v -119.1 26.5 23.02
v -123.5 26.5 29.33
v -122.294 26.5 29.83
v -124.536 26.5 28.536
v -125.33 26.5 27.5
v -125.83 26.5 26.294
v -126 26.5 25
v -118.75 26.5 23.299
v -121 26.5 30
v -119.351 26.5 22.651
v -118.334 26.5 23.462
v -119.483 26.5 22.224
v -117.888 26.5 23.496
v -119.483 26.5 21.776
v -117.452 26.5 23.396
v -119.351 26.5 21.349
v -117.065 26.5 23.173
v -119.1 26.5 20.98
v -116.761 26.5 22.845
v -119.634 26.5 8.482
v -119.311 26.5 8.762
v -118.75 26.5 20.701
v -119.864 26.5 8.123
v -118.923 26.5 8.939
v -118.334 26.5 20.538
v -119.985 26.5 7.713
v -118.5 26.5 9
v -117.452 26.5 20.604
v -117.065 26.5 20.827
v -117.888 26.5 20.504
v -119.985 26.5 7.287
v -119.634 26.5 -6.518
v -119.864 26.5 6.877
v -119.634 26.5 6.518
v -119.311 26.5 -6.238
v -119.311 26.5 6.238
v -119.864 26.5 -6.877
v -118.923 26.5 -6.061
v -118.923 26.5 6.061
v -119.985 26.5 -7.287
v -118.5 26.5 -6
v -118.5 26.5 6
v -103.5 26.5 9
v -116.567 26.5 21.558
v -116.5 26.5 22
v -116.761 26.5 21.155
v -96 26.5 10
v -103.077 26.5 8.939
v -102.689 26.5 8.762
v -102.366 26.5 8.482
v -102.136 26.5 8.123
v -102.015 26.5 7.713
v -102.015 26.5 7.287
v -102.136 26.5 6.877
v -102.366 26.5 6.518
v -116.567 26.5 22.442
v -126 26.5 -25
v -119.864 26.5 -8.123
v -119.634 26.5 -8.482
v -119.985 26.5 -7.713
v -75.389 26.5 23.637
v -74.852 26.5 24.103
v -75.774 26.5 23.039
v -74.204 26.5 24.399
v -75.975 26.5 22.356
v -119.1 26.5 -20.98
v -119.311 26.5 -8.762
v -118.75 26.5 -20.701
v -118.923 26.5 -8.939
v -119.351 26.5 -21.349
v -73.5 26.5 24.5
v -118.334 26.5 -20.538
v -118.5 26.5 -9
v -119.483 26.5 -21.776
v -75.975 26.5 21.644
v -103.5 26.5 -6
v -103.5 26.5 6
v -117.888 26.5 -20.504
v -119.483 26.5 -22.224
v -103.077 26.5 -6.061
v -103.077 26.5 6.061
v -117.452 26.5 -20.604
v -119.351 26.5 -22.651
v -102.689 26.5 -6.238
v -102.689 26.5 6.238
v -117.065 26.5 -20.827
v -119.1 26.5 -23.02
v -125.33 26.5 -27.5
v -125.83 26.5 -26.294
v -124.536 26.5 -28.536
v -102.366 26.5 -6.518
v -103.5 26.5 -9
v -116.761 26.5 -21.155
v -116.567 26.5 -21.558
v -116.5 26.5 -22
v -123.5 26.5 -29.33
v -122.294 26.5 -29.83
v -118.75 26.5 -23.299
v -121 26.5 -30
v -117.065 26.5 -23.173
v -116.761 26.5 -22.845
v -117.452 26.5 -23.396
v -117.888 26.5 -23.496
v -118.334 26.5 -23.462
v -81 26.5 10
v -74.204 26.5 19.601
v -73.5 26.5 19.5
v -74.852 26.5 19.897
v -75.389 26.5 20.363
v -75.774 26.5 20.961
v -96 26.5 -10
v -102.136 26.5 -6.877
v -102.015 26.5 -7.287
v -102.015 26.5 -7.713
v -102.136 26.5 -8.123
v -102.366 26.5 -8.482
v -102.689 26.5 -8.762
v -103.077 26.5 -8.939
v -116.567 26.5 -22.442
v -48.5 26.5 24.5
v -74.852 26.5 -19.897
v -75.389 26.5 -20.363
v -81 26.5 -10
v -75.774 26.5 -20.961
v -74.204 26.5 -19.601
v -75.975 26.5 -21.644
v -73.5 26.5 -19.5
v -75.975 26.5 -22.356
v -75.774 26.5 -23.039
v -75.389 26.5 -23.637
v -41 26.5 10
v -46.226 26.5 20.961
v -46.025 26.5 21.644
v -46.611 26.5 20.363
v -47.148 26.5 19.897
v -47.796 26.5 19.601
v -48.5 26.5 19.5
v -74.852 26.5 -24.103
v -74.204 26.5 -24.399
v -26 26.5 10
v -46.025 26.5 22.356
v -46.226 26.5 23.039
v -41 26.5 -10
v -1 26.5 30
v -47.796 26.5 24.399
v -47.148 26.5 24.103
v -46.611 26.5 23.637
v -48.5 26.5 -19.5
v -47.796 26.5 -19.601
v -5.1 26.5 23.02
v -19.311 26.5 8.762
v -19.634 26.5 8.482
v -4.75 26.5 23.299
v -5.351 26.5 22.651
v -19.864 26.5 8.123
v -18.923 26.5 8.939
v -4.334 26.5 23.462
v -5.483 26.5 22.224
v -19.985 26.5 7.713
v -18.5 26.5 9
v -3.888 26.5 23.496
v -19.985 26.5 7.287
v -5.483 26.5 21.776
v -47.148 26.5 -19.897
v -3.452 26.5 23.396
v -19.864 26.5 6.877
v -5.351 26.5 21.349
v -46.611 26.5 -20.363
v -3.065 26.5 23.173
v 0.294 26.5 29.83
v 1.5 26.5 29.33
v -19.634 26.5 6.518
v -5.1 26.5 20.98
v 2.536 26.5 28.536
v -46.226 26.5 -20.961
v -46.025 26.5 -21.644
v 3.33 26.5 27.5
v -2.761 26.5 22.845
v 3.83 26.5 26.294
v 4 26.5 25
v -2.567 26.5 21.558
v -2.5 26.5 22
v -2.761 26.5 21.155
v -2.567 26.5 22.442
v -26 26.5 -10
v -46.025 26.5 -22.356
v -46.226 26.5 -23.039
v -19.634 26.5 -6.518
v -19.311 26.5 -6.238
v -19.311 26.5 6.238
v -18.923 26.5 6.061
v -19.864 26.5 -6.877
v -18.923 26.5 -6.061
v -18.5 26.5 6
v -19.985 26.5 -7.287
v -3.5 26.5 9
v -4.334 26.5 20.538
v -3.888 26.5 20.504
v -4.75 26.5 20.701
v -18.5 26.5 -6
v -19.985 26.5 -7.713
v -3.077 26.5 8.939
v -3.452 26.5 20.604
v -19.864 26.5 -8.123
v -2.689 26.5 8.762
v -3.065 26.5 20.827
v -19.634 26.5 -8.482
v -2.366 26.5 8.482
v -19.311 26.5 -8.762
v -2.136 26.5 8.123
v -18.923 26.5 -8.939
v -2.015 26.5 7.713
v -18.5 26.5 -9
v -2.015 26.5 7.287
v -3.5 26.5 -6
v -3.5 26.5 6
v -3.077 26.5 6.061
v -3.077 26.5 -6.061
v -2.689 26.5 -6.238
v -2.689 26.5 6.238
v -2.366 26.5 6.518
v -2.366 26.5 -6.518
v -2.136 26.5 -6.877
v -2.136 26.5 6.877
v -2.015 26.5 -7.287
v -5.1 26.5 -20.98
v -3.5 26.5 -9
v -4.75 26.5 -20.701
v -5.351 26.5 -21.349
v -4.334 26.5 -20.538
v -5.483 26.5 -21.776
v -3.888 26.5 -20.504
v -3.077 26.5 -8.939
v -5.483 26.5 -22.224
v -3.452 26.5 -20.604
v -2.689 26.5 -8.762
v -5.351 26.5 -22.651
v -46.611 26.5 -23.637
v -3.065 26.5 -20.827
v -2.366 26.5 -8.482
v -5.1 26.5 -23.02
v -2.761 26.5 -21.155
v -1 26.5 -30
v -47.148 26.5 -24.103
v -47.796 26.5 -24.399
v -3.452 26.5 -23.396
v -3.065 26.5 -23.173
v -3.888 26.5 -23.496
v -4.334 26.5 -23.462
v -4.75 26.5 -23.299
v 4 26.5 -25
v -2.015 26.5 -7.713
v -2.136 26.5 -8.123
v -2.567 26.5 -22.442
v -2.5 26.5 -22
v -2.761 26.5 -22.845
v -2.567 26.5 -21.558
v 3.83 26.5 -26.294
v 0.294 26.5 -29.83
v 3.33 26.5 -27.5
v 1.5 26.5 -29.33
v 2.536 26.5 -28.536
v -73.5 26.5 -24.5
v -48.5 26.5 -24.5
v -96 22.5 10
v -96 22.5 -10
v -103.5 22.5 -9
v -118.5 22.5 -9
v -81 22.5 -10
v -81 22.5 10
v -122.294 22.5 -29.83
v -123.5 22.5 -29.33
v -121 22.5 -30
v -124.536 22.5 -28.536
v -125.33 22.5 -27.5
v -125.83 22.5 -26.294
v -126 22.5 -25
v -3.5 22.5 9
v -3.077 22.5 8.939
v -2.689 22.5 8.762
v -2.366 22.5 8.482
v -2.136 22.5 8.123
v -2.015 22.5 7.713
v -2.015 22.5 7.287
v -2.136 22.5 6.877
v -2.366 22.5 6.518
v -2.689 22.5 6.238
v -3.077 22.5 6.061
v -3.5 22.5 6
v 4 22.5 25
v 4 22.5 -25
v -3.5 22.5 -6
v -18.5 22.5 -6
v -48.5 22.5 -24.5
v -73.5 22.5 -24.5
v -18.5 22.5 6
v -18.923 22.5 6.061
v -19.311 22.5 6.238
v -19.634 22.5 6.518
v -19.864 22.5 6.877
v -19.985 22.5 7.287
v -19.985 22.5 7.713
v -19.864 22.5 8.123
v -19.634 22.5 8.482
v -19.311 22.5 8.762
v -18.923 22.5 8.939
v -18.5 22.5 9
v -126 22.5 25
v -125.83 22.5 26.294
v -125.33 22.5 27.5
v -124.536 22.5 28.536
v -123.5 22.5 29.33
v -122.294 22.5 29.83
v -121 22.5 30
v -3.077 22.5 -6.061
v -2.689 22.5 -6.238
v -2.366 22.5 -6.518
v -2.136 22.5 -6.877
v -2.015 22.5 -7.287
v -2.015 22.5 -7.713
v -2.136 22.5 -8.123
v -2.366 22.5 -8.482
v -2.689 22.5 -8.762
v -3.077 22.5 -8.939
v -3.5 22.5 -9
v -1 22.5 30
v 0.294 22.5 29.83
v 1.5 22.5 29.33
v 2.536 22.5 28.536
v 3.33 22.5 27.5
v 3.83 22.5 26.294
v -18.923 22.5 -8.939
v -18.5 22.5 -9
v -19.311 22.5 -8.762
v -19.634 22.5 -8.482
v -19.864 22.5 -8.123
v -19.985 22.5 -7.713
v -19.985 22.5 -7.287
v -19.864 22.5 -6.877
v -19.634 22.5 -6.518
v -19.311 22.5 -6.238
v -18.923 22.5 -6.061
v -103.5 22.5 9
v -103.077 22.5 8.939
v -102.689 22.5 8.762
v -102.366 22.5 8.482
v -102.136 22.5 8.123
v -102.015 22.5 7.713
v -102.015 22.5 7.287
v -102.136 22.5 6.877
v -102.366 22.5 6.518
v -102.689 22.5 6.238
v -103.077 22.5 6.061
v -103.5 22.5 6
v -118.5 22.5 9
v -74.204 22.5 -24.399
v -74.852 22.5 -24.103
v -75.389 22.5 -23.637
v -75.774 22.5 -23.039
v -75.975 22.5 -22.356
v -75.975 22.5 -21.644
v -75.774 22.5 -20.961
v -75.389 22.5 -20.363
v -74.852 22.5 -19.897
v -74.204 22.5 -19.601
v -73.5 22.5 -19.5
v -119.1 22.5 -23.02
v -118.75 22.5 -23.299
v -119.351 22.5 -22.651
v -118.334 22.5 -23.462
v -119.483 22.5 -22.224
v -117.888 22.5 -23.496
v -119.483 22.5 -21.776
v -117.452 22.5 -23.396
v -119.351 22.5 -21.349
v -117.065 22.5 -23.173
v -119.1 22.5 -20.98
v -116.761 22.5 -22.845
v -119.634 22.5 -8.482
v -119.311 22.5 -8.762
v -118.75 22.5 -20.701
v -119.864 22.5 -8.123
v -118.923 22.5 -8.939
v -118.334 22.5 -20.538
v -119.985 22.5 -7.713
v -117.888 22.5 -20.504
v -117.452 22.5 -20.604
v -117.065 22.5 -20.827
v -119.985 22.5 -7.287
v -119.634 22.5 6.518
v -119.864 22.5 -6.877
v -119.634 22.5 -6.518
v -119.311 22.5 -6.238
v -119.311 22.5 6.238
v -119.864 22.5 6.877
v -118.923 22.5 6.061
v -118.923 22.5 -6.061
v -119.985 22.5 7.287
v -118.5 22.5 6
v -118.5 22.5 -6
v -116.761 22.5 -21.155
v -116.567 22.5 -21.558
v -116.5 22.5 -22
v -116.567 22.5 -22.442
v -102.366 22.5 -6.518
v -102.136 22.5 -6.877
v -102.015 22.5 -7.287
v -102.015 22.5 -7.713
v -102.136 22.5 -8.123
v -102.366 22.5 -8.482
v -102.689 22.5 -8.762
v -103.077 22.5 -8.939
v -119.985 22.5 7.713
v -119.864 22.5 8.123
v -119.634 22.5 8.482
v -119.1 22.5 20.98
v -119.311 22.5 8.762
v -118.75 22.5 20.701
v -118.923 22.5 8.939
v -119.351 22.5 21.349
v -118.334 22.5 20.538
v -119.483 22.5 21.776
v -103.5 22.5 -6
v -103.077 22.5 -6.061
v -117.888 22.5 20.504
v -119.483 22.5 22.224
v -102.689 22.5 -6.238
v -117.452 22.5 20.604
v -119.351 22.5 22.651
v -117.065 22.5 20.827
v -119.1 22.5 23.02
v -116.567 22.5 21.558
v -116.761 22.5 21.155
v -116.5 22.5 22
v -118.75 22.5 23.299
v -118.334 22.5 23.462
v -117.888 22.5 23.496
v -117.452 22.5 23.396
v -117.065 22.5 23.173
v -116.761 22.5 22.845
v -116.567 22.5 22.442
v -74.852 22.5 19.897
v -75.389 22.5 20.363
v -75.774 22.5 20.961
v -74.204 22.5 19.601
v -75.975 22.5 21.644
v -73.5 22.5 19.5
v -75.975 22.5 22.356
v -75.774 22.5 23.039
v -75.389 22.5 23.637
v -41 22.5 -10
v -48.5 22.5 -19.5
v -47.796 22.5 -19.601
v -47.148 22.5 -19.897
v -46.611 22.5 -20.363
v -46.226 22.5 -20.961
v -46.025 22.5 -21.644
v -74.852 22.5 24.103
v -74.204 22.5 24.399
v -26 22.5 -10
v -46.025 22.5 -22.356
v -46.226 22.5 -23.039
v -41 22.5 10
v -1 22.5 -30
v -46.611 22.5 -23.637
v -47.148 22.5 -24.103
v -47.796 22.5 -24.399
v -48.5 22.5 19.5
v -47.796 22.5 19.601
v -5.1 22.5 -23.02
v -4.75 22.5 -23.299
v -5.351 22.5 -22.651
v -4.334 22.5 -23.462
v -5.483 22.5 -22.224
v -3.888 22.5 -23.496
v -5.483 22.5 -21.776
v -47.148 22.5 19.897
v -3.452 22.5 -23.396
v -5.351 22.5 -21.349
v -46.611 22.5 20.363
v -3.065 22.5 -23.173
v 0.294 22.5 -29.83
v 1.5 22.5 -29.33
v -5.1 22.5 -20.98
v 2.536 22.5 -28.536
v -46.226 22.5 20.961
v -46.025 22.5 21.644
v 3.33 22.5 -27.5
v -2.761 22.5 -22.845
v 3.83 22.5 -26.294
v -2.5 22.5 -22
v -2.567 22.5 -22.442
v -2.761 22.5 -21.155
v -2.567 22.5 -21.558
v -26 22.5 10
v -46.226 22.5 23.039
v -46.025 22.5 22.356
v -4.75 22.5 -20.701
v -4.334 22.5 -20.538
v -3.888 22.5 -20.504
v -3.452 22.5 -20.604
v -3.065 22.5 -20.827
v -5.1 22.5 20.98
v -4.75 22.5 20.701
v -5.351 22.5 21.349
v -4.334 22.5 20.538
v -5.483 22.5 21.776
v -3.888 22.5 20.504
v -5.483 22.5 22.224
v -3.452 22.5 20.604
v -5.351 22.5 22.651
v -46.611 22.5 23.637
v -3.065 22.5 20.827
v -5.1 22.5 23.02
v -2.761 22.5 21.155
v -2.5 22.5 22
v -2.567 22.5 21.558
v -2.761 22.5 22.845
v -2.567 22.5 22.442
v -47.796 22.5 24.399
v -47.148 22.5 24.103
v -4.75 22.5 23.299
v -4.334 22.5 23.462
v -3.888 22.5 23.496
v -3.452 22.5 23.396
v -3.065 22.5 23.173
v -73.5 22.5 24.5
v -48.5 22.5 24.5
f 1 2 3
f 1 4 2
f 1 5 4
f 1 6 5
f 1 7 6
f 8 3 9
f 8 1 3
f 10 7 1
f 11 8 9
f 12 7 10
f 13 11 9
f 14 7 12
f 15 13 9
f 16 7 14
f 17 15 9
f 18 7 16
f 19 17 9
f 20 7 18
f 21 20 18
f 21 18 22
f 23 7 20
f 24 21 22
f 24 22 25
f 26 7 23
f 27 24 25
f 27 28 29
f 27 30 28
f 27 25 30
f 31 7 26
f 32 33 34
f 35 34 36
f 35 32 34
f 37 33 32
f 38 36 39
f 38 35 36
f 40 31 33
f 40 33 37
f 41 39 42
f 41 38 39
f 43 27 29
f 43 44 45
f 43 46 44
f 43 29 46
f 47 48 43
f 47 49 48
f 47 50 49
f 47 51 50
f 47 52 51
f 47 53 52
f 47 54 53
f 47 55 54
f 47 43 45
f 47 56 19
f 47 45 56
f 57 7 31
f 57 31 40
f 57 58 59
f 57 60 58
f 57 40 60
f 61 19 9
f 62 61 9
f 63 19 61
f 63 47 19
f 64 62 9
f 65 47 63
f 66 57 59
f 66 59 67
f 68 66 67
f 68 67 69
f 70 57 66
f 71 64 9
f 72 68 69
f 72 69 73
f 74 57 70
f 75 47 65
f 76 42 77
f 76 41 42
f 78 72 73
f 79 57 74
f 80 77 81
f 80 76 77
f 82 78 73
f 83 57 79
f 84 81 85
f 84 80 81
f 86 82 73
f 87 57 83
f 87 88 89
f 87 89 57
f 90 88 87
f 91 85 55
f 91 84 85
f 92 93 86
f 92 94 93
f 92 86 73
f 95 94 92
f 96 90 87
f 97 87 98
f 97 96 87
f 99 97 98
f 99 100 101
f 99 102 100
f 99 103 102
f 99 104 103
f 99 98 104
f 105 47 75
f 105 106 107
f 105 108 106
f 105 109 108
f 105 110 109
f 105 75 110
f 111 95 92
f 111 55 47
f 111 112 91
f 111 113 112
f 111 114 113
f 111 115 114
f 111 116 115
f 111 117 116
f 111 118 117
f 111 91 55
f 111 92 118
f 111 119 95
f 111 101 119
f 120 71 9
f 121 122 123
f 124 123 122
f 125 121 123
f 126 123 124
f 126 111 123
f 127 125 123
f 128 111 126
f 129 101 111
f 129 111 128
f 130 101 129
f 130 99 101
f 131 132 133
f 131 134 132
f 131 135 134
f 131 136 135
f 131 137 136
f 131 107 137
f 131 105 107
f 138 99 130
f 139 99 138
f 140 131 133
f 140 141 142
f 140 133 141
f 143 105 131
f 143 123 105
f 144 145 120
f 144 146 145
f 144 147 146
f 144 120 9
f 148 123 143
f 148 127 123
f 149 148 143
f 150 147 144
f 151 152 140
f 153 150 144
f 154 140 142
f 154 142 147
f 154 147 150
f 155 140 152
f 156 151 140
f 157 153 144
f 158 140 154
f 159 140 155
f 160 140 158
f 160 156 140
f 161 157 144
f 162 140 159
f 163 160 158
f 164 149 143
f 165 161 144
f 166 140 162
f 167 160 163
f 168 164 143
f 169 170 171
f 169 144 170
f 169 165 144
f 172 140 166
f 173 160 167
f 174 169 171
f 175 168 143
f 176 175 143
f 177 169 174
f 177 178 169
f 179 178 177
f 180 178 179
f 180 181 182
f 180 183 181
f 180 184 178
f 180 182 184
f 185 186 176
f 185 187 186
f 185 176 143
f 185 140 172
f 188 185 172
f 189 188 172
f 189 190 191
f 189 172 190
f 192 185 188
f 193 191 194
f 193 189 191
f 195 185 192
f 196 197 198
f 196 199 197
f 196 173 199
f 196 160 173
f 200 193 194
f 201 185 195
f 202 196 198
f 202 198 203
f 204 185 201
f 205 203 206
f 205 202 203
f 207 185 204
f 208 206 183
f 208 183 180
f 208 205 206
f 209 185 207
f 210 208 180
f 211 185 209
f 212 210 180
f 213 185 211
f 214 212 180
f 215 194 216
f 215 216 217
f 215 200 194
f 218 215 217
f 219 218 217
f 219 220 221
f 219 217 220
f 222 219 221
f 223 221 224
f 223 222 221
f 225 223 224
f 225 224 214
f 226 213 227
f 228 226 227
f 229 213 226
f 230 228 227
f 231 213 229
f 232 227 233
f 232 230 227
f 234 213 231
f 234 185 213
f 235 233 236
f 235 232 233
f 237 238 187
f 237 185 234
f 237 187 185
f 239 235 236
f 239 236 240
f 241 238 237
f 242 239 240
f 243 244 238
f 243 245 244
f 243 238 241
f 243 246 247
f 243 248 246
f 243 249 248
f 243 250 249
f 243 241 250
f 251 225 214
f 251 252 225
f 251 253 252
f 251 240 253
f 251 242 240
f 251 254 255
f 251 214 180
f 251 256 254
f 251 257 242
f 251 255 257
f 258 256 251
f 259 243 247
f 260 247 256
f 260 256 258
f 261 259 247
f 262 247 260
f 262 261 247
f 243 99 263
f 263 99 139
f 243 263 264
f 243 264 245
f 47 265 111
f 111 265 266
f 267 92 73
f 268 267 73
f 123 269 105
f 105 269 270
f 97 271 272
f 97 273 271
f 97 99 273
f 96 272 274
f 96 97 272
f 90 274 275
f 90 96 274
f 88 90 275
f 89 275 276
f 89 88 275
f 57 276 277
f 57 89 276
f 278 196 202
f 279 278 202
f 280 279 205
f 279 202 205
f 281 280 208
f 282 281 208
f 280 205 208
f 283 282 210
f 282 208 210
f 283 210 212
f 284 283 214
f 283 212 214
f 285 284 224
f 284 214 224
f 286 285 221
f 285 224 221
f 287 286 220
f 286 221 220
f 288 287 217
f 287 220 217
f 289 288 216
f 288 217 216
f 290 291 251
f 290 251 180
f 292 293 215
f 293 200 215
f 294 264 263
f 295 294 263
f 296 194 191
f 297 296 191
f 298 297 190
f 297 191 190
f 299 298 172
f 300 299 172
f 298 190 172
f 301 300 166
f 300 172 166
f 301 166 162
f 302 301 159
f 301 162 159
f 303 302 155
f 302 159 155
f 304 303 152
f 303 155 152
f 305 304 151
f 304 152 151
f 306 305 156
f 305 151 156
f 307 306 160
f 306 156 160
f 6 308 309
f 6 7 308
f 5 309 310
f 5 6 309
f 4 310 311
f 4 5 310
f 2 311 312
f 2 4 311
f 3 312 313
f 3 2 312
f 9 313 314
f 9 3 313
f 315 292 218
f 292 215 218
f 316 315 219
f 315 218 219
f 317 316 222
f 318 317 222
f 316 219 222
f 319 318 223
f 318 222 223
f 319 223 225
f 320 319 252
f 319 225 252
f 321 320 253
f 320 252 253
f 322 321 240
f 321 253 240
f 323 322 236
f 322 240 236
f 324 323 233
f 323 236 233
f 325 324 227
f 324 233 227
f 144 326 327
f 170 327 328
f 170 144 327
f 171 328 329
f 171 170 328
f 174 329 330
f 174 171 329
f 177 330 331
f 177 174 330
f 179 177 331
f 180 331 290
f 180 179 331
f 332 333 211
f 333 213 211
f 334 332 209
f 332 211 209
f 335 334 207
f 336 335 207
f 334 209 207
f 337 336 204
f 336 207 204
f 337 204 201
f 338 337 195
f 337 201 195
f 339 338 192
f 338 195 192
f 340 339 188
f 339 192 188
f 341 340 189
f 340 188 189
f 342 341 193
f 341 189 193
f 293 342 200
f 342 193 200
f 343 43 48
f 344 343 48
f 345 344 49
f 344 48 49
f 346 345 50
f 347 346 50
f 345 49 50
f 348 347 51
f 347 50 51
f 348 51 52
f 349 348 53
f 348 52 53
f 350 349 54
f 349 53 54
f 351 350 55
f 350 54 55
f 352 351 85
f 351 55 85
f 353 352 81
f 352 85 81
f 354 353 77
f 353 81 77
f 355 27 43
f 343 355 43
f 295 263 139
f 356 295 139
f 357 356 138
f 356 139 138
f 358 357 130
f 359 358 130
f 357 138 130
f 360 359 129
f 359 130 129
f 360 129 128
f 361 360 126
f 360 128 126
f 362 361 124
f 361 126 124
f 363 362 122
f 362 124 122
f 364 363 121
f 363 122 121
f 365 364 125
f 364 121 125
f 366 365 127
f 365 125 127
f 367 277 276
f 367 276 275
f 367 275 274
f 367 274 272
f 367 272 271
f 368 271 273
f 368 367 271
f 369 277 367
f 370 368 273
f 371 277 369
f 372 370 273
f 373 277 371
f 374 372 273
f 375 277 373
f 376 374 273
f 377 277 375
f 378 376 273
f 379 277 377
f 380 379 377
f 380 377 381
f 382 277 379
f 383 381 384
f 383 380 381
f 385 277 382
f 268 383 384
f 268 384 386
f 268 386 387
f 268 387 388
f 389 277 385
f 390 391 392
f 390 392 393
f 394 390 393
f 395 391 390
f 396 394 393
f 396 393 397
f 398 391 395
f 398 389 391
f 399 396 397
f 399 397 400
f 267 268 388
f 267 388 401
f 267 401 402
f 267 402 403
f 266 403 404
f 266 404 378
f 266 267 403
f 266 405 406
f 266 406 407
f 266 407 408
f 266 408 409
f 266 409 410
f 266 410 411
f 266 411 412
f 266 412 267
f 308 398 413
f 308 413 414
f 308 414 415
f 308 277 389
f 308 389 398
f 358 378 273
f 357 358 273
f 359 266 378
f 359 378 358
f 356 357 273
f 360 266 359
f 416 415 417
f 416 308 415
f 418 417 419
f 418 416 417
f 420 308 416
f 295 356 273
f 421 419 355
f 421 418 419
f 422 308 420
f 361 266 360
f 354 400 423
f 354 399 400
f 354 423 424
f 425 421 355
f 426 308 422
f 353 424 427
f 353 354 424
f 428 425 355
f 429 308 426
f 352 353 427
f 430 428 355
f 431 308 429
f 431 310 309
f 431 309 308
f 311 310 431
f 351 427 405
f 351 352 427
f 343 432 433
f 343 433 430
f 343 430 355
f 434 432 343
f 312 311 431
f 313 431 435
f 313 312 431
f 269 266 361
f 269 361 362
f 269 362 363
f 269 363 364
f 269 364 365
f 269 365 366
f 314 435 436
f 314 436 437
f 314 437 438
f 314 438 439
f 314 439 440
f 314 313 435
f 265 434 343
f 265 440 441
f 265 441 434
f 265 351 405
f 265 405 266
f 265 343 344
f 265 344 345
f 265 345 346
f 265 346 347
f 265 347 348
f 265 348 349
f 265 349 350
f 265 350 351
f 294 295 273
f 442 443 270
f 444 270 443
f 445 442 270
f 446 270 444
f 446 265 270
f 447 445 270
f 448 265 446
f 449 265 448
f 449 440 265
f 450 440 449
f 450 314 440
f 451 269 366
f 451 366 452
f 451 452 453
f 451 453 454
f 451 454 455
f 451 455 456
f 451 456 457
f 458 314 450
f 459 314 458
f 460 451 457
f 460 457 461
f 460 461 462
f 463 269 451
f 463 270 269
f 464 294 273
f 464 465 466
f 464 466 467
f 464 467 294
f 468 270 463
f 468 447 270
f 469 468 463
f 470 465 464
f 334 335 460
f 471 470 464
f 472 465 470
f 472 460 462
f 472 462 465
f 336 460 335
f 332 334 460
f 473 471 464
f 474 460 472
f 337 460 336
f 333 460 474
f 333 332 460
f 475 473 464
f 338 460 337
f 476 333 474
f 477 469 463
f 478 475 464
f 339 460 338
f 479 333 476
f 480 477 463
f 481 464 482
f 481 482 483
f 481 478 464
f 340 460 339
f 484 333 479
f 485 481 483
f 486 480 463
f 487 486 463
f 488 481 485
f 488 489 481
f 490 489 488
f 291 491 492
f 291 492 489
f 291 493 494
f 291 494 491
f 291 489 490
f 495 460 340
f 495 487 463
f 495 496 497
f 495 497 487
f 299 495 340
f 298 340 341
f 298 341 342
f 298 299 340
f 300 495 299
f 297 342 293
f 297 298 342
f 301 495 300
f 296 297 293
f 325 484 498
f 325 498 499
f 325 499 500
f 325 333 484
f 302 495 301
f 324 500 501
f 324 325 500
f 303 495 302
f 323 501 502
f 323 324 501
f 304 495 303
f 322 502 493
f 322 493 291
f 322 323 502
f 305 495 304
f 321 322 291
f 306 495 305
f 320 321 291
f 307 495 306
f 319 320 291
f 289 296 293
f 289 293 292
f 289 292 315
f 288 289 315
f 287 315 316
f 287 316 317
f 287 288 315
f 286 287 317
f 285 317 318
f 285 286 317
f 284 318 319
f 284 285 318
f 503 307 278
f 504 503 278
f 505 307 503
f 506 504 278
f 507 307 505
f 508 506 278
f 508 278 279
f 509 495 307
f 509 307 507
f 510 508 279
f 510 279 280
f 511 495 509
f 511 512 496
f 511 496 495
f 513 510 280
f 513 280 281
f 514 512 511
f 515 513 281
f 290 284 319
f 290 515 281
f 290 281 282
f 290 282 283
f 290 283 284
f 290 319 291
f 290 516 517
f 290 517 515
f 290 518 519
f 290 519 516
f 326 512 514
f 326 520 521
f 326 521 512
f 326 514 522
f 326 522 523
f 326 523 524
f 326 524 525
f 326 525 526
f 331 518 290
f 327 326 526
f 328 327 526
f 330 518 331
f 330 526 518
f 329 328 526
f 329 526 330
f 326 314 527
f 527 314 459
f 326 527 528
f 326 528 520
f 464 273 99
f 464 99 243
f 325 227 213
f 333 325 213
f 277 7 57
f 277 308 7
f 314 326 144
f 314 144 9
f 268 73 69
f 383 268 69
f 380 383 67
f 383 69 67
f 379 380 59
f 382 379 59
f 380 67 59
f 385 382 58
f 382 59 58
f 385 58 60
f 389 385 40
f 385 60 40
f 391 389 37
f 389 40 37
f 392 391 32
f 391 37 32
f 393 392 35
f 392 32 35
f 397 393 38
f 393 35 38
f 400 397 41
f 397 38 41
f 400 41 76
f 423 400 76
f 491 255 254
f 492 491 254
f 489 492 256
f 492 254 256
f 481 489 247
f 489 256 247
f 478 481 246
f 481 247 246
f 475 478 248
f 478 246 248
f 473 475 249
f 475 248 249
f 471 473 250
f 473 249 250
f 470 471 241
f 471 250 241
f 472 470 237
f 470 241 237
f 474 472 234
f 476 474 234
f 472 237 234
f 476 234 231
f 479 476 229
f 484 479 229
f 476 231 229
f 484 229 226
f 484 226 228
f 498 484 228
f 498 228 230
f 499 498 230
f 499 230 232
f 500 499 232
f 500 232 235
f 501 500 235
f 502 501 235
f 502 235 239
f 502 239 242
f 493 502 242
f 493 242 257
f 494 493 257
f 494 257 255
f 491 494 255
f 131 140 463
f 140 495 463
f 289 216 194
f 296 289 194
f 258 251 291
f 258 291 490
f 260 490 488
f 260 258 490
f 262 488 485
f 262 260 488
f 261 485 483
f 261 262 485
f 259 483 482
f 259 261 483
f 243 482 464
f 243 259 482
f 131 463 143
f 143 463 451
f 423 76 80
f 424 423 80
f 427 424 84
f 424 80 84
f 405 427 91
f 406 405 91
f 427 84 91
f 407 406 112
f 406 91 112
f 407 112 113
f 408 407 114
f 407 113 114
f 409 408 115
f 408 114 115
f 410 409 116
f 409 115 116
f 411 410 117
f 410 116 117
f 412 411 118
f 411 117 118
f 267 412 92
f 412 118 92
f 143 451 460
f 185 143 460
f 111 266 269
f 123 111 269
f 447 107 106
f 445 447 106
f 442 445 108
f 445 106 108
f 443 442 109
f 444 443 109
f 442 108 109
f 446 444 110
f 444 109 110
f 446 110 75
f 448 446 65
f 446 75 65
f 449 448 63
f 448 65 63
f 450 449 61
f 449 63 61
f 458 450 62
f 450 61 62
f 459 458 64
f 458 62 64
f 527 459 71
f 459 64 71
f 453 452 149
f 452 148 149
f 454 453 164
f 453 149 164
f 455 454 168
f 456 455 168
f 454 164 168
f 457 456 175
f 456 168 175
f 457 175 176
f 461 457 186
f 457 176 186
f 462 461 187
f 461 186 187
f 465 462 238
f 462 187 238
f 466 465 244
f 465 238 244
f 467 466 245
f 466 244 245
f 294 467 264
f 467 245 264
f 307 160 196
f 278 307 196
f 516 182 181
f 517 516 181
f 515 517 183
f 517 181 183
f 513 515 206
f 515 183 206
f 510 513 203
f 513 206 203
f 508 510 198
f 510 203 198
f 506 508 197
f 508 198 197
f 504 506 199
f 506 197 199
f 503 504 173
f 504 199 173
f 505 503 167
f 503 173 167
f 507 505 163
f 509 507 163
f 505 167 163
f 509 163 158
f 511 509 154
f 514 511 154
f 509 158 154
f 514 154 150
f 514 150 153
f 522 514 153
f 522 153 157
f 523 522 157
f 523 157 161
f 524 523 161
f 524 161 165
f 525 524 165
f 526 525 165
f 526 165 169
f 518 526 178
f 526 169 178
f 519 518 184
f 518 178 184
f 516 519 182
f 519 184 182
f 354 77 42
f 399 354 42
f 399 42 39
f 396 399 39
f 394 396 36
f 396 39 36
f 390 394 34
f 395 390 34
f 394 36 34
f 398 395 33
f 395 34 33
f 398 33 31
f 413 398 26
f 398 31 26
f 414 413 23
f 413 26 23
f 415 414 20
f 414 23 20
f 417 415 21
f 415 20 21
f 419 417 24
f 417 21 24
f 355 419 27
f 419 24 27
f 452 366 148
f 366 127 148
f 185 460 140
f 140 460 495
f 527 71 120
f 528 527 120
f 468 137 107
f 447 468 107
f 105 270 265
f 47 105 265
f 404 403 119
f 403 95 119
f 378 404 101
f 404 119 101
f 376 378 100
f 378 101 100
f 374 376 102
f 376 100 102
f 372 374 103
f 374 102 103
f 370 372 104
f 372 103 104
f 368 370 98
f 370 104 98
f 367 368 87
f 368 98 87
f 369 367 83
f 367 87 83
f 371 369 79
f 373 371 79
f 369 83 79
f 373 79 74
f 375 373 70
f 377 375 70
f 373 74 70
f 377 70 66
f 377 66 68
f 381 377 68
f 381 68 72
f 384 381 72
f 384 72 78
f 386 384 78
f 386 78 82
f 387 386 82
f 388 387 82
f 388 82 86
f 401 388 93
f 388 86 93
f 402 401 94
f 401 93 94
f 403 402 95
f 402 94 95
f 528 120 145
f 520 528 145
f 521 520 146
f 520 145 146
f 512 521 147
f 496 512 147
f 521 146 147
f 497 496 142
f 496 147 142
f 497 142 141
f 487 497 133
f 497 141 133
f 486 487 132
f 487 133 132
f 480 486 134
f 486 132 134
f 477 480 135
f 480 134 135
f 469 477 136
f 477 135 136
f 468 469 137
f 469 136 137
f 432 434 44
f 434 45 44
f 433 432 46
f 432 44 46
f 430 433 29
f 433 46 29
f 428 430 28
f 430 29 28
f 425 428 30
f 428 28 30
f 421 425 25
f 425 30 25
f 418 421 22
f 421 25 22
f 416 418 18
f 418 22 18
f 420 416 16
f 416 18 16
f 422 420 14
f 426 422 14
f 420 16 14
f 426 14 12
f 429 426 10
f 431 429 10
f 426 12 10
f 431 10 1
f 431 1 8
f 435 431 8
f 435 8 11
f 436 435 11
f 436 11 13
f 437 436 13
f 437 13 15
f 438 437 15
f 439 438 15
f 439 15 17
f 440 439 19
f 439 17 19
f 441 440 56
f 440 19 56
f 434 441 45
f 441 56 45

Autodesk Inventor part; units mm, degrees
ref_plane "YZ Plane" through (0, 0, 0) normal (1, 0, 0) x (0, 1, 0)
ref_plane "XZ Plane" through (0, 0, 0) normal (0, 1, 0) x (-1, 0, 0)
sketch "Motor Support" plane through (0, 0, 0) normal (1, 0, 0) x (0, 1, 0)
  circle A0 centre (0, 0) radius 11.25
  line L0 (-12.5, -22.5) -> (22.5, -22.5)
  line L1 (22.5, -22.5) -> (22.5, 22.5)
  line L2 (22.5, 22.5) -> (-12.5, 22.5)
  line L3 (-22.5, 12.5) -> (-22.5, -12.5)
  arc A1 (-12.5, 22.5) -> (-22.5, 12.5) centre (-12.5, 12.5) ccw
  arc A2 (-22.5, -12.5) -> (-12.5, -22.5) centre (-12.5, -12.5) ccw
  circle A3 centre (15.5, 15.5) radius 1.5
  circle A4 centre (15.5, -15.5) radius 1.5
  circle A5 centre (-15.5, 15.5) radius 1.5
  circle A6 centre (-15.5, -15.5) radius 1.5
  point P0 (-22.5, 22.5)
  point P1 (22.5, 0)
  dimension "d0" = 22.5
  dimension "d1" = 45
  dimension "d2" = 45
  dimension "d3" = 10
  dimension "d4" = 22.5
  dimension "d5" = 3
  dimension "d6" = 3
  dimension "d7" = 3
  dimension "d8" = 3
  dimension "d9" = 31
  dimension "d10" = 31
  dimension "d11" = 15.5
  dimension "d12" = 15.5
extrude "Motor Support E" add sketch "Motor Support" along normal blind 4
sketch "Base" plane through (0, 22.5, 22.5) normal (0, 1, 0) x (1, 0, 0)
  line L0 (0, 45) -> (0, 0) projected
  line L1 (0, 0) -> (4, 0) projected
  line L2 (4, 45) -> (4, 0) projected
  line L3 (0, 45) -> (4, 45) projected
  line L4 (4, -7.5) -> (-61, -7.5)
  line L5 (-61, -7.5) -> (-61, 52.5)
  line L6 (-61, 52.5) -> (4, 52.5)
  line L7 (4, 52.5) -> (4, -7.5)
  line L8 (-41, 32.5) -> (-26, 32.5)
  line L9 (-26, 32.5) -> (-26, 12.5)
  line L10 (-26, 12.5) -> (-41, 12.5)
  line L11 (-41, 12.5) -> (-41, 32.5)
  point P0 (0, 22.5)
  point P1 (4, 22.5)
  point P2 (-26, 22.5)
  point P3 (0, 22.5)
  dimension "d15" = 65
  dimension "d16" = 60
  dimension "d19" = 15
  dimension "d20" = 20
  dimension "d21" = 26
extrude "Base E" add sketch "Base" along normal blind 4
ref_plane "Mid Plane" through (-61, 26.5, 30) normal (-1, 0, 0) x (0, 0, 1)
mirror "Mirror Base" about plane through (-61, 26.5, 30) normal (-1, 0, 0)
fillet "Fillet1" radius 5 4 edges at (4, 24.5, 30) (4, 24.5, -30) (-126, 24.5, 30) (-126, 24.5, -30)
fillet "Fillet2" radius 5 4 edges at (2, 22.5, -22.5) (2, 22.5, 22.5) (-124, 22.5, -22.5) (-124, 22.5, 22.5)
sketch "Base Hole Pattern" plane through (0, 26.5, 22.5) normal (0, 1, 0) x (1, 0, 0)
  circle A0 centre (-4, 0.5) radius 1.5
  circle A1 centre (-118, 44.5) radius 1.5
  circle A2 centre (-118, 0.5) radius 1.5
  circle A3 centre (-4, 44.5) radius 1.5
  arc A4 (-121, 52.5) -> (-126, 47.5) centre (-121, 47.5) ccw projected
  line L0 (-126, -2.5) -> (-126, 47.5) projected
  arc A5 (-126, -2.5) -> (-121, -7.5) centre (-121, -2.5) ccw projected
  line L1 (-1, -7.5) -> (-121, -7.5) projected
  arc A6 (-1, -7.5) -> (4, -2.5) centre (-1, -2.5) ccw projected
  line L2 (4, -2.5) -> (4, 47.5) projected
  arc A7 (4, 47.5) -> (-1, 52.5) centre (-1, 47.5) ccw projected
  line L3 (-1, 52.5) -> (-121, 52.5) projected
  line L4 (-81, 32.5) -> (-96, 32.5) projected
  line L5 (-81, 12.5) -> (-81, 32.5) projected
  line L6 (-96, 12.5) -> (-81, 12.5) projected
  line L7 (-96, 32.5) -> (-96, 12.5) projected
  line L8 (-41, 32.5) -> (-26, 32.5) projected
  line L9 (-26, 32.5) -> (-26, 12.5) projected
  line L10 (-26, 12.5) -> (-41, 12.5) projected
  line L11 (-41, 12.5) -> (-41, 32.5) projected
  line L12 (-73.5, 44.5) -> (-48.5, 44.5) construction
  line L13 (-73.5, 42) -> (-48.5, 42)
  line L14 (-48.5, 47) -> (-73.5, 47)
  arc A8 (-73.5, 47) -> (-73.5, 42) centre (-73.5, 44.5) ccw
  arc A9 (-48.5, 42) -> (-48.5, 47) centre (-48.5, 44.5) ccw
  line L15 (-73.5, 0.5) -> (-48.5, 0.5) construction
  line L16 (-73.5, -2) -> (-48.5, -2)
  line L17 (-48.5, 3) -> (-73.5, 3)
  arc A10 (-73.5, 3) -> (-73.5, -2) centre (-73.5, 0.5) ccw
  arc A11 (-48.5, -2) -> (-48.5, 3) centre (-48.5, 0.5) ccw
  line L18 (-118.5, 30) -> (-103.5, 30) construction
  line L19 (-118.5, 28.5) -> (-103.5, 28.5)
  line L20 (-103.5, 31.5) -> (-118.5, 31.5)
  arc A12 (-118.5, 31.5) -> (-118.5, 28.5) centre (-118.5, 30) ccw
  arc A13 (-103.5, 28.5) -> (-103.5, 31.5) centre (-103.5, 30) ccw
  line L21 (-118.5, 15) -> (-103.5, 15) construction
  line L22 (-118.5, 13.5) -> (-103.5, 13.5)
  line L23 (-103.5, 16.5) -> (-118.5, 16.5)
  arc A14 (-118.5, 16.5) -> (-118.5, 13.5) centre (-118.5, 15) ccw
  arc A15 (-103.5, 13.5) -> (-103.5, 16.5) centre (-103.5, 15) ccw
  line L24 (-18.5, 30) -> (-3.5, 30) construction
  line L25 (-18.5, 28.5) -> (-3.5, 28.5)
  line L26 (-3.5, 31.5) -> (-18.5, 31.5)
  arc A16 (-18.5, 31.5) -> (-18.5, 28.5) centre (-18.5, 30) ccw
  arc A17 (-3.5, 28.5) -> (-3.5, 31.5) centre (-3.5, 30) ccw
  line L27 (-18.5, 15) -> (-3.5, 15) construction
  line L28 (-18.5, 13.5) -> (-3.5, 13.5)
  line L29 (-3.5, 16.5) -> (-18.5, 16.5)
  arc A18 (-18.5, 16.5) -> (-18.5, 13.5) centre (-18.5, 15) ccw
  arc A19 (-3.5, 13.5) -> (-3.5, 16.5) centre (-3.5, 15) ccw
  point P0 (-61, 44.5)
  point P1 (-61, 52.5)
  point P2 (-61, 0.5)
  point P3 (-111, 30)
  point P4 (-111, 15)
  point P5 (-11, 30)
  point P6 (-11, 15)
  dimension "d29" = 3
  dimension "d30" = 3
  dimension "d33" = 3
  dimension "d34" = 3
  dimension "d35" = 8
  dimension "d36" = 8
  dimension "d37" = 8
  dimension "d38" = 8
  dimension "d43" = 25
  dimension "d44" = 5
  dimension "d45" = 25
  dimension "d46" = 2.5
  dimension "d47" = 15
  dimension "d48" = 3
  dimension "d49" = 15
  dimension "d50" = 3
  dimension "d51" = 15
  dimension "d52" = 15
  dimension "d53" = 22.5
  dimension "d56" = 15
  dimension "d57" = 3
  dimension "d58" = 15
  dimension "d59" = 3
  dimension "d60" = 15
  dimension "d61" = 22.5
  dimension "d62" = 15
extrude "Spacer Holes" cut sketch "Base Hole Pattern" against normal blind 10 contours A0 | A1 | A2 | A3
extrude "Base Slots" cut sketch "Base Hole Pattern" against normal blind 10 contours A8 L14 A9 L13 | A10 L17 A11 L16 | A12 L20 A13 L19 | A14 L23 A15 L22 | A16 L26 A17 L25 | A18 L29 A19 L28
sketch "Sketch6" plane through (-122, -22.5, -12.5) normal (0, -1, 0) x (1, 0, 0)
  line L0 (-11.238, 55.4401) -> (134.3481, 55.4401)
  line L1 (134.3481, 55.4401) -> (134.3481, -24.4895)
  line L2 (134.3481, -24.4895) -> (-11.238, -24.4895)
  line L3 (-11.238, -24.4895) -> (-11.238, 55.4401)
  point P0 (122, 12.5)
extrude "Extrusion7" cut sketch "Sketch6" against normal up to surface (45 mm away)
equation "\"d6\" = d5"
equation "\"d7\" = d5"
equation "\"d8\" = d5"
equation "\"d30\" = d29"
equation "\"d33\" = d29"
equation "\"d34\" = d29"
equation "\"d36\" = d35"
equation "\"d37\" = d35"
equation "\"d38\" = d35"
equation "\"d45\" = d43"
equation "\"d46\" = 0.5 * d44"
equation "\"d49\" = d47"
equation "\"d50\" = d48"
equation "\"d56\" = d47"
equation "\"d57\" = d48"
equation "\"d58\" = d47"
equation "\"d59\" = d48"
equation "\"d60\" = d52"
equation "\"d61\" = d53"
equation "\"d62\" = d51"
properties part number "Top"
